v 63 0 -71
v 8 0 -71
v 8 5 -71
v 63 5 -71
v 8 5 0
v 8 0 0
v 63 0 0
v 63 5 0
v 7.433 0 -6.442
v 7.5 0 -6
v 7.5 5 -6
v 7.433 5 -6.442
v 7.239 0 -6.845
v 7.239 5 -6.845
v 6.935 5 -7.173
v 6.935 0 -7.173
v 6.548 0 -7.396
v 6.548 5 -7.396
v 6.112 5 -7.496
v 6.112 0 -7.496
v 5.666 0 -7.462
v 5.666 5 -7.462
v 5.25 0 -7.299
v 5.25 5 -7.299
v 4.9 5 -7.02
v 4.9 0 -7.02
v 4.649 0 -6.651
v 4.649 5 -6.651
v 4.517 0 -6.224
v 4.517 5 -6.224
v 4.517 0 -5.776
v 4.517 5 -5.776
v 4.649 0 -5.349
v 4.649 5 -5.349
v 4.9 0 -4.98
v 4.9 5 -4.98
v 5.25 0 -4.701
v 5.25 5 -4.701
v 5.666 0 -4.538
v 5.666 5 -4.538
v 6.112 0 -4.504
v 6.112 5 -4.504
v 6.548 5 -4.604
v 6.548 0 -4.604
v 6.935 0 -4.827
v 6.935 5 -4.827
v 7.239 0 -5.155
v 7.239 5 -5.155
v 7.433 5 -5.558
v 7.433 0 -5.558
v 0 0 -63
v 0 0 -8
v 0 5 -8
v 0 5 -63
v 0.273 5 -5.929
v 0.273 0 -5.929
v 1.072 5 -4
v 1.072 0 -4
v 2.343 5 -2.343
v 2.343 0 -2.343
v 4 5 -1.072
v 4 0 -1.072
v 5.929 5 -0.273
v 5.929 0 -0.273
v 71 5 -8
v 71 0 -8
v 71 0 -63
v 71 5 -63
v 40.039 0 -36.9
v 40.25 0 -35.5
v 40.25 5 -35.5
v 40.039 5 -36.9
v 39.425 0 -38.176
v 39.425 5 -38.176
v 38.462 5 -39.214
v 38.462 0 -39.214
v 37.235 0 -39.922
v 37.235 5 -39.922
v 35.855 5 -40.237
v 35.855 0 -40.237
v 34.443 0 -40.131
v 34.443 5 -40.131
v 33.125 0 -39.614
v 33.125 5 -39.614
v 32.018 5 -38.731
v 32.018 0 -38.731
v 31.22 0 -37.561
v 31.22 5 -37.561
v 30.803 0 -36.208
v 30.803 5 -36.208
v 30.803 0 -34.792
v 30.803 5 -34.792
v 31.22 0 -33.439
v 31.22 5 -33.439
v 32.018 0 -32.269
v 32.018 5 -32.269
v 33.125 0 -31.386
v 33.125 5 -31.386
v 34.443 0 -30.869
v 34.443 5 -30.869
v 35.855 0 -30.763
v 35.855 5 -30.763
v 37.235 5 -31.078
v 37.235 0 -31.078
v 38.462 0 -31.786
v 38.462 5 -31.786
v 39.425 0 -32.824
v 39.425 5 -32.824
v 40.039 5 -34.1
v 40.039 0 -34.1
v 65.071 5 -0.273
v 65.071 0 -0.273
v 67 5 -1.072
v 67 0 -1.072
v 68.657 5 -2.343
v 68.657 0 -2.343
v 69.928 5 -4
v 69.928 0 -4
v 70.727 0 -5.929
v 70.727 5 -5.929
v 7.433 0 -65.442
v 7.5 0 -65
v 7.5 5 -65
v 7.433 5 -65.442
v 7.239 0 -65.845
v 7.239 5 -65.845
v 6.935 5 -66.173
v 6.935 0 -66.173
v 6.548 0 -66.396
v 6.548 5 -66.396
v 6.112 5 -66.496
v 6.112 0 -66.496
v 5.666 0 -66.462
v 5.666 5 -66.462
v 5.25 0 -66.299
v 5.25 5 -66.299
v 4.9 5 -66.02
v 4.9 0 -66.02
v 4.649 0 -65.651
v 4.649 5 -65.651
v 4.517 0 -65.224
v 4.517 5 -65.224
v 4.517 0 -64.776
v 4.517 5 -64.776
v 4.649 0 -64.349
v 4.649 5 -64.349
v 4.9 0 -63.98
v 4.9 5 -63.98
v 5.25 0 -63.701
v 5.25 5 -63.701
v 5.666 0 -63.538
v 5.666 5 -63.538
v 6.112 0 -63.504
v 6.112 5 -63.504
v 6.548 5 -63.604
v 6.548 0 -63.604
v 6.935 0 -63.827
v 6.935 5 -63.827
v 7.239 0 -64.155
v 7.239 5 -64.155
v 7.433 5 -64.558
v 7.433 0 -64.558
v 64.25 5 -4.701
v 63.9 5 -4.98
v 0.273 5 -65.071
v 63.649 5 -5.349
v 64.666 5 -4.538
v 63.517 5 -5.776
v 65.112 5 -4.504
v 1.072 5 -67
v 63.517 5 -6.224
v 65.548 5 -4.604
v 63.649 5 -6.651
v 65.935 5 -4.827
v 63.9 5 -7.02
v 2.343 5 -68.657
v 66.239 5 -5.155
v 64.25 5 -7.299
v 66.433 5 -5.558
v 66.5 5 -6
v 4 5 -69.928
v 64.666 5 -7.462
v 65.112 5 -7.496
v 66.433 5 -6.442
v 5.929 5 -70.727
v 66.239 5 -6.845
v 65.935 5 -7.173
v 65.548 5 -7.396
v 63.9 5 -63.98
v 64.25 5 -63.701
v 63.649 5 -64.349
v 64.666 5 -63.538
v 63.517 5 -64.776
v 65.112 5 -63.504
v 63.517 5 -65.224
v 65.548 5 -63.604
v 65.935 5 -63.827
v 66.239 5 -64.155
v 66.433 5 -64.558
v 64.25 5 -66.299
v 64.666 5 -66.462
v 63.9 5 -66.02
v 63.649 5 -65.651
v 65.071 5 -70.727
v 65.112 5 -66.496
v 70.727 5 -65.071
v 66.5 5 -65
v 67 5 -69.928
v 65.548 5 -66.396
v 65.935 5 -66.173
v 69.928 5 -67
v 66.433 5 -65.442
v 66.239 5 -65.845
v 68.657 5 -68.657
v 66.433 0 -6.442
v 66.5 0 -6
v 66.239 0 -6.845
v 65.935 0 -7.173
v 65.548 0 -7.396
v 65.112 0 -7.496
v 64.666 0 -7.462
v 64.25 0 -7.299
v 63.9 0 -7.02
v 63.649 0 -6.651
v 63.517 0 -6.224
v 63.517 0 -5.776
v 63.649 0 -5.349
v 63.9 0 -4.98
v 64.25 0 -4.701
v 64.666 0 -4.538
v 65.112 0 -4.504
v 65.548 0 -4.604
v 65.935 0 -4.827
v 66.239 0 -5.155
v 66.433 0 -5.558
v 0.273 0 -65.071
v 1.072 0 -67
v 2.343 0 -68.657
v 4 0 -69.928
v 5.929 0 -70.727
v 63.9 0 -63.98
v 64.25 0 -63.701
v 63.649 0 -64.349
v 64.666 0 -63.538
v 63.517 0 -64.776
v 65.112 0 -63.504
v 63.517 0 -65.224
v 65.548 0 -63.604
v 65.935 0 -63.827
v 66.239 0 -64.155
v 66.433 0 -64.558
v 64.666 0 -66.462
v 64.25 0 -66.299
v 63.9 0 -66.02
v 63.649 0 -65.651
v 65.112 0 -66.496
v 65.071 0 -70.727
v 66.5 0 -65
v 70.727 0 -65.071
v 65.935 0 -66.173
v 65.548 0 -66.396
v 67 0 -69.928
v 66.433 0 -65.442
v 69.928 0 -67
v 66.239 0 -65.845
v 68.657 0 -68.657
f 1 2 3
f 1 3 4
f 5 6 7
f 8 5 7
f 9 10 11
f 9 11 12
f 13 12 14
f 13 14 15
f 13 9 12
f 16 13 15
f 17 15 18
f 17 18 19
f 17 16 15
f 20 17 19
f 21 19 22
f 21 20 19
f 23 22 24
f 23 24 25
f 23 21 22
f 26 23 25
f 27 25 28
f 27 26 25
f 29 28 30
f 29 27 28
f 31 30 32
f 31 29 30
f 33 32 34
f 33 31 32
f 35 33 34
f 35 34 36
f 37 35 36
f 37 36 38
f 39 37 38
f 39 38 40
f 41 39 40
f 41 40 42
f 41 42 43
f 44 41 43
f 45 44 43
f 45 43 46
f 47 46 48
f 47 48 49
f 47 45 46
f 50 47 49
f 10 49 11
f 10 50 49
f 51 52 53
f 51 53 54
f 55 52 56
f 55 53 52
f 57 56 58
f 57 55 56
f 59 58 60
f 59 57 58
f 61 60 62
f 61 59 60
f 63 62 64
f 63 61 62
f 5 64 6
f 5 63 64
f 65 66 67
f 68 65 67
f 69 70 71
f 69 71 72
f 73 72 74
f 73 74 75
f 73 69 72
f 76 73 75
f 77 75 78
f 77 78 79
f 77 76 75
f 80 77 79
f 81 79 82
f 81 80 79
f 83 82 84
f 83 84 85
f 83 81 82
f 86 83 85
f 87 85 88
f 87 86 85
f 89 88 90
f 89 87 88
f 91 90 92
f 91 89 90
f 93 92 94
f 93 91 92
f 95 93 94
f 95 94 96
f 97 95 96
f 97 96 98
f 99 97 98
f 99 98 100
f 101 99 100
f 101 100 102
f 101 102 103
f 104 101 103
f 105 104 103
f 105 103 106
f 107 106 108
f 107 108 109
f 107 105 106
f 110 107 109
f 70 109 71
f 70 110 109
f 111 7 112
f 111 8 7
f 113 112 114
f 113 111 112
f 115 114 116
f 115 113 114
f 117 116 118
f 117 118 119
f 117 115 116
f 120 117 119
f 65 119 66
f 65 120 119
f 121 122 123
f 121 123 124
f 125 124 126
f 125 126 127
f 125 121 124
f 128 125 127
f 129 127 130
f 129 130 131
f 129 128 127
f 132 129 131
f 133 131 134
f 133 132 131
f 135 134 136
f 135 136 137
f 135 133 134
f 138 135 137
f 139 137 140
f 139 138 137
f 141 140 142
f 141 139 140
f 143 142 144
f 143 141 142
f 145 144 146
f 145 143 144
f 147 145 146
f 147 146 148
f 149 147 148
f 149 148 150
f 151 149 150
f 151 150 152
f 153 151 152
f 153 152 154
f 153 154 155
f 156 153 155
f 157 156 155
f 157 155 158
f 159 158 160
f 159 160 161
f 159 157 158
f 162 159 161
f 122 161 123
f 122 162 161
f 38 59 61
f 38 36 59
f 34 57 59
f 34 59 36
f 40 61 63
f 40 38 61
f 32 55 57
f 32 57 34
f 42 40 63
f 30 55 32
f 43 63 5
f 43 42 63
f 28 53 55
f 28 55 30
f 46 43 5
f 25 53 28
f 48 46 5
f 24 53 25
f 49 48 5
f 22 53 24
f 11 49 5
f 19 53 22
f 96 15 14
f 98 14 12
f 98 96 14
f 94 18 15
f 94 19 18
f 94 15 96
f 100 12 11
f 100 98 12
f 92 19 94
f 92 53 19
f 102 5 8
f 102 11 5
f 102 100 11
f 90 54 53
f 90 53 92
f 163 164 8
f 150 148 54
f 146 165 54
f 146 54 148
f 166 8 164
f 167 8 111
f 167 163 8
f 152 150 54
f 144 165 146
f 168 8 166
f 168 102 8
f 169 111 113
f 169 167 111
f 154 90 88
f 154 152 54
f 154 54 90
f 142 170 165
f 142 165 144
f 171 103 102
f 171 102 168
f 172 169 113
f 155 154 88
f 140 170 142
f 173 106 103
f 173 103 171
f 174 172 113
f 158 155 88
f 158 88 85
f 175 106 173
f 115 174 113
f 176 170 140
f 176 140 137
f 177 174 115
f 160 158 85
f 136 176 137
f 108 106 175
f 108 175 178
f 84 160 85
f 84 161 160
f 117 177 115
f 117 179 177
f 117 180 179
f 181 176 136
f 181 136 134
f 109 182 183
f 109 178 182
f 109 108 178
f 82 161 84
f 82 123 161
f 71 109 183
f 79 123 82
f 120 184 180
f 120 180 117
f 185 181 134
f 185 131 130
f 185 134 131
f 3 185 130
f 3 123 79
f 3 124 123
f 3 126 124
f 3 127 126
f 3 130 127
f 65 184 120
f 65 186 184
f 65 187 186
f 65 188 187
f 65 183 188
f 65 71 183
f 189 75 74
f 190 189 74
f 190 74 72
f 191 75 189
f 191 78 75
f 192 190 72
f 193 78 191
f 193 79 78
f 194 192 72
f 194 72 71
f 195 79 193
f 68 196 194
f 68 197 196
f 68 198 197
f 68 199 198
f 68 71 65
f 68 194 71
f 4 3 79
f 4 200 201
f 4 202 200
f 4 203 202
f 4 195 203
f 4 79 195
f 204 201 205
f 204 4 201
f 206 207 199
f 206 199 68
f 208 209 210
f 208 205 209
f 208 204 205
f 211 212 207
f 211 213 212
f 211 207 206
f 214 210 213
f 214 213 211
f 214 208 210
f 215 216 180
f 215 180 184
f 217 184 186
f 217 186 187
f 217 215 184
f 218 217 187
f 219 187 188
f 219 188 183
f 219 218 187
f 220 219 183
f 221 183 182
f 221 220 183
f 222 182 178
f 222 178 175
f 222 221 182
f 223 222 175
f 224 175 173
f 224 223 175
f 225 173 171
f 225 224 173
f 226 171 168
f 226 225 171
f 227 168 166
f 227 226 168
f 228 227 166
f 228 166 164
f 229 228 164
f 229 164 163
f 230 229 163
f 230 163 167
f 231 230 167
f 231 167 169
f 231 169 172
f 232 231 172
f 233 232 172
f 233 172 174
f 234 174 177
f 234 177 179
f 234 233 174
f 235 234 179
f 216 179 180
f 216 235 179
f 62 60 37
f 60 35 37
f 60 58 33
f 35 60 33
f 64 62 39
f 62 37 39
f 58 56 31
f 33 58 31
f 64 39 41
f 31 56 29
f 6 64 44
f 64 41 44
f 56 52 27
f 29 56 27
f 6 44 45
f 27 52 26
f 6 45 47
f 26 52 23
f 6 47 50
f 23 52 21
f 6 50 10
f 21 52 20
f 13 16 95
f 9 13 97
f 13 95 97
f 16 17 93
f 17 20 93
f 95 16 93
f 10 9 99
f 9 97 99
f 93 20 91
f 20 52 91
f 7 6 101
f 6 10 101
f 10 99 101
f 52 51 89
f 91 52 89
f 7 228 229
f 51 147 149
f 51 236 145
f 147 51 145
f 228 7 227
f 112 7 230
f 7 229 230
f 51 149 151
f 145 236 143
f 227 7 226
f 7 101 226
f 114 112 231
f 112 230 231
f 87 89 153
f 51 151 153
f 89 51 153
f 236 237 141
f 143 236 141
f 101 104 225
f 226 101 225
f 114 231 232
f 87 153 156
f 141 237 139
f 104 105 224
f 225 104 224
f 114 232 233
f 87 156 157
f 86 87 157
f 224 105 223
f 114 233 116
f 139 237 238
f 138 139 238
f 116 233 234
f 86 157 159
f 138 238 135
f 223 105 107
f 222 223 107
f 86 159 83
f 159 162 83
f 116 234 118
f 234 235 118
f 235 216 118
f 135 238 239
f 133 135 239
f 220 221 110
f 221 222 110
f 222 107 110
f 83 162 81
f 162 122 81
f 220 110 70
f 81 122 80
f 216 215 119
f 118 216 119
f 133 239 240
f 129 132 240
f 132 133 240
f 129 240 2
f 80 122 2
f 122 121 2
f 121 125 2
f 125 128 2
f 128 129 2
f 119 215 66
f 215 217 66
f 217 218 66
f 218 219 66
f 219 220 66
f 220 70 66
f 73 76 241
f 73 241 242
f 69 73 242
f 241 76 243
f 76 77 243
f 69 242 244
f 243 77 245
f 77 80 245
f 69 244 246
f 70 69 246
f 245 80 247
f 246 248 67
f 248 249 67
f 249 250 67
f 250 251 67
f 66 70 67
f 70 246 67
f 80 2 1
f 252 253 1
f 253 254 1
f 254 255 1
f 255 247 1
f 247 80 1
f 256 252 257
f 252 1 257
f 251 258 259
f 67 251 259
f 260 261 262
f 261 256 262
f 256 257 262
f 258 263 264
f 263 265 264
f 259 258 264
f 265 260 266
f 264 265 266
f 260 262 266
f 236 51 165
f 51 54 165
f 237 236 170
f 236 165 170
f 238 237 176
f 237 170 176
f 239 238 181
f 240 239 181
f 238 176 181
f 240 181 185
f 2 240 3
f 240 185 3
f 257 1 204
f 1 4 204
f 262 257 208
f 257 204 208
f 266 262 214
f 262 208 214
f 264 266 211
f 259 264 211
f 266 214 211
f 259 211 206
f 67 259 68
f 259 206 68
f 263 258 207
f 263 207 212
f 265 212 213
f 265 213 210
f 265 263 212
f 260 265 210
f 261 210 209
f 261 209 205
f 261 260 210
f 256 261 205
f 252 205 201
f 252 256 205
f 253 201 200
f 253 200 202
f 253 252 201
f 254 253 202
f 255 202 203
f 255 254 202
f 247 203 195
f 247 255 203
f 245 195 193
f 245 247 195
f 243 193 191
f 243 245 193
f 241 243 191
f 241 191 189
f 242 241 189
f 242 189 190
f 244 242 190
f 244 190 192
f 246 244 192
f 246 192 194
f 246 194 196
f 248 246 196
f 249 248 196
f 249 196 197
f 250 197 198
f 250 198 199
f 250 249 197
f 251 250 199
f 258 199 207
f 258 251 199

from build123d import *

# Parameters (mm, degrees)
SKETCH1_W           = 71
SKETCH1_H           = 71
SKETCH1_R           = 1.5
SKETCH1_R_2         = 4.75
BOSS_EXTRUDE1_DEPTH = 5
FILLET1_R           = 8


with BuildPart() as part:
    # Sketch1 → Boss-Extrude1 (new body)
    with BuildSketch(Plane(origin=(0, 0, 0), x_dir=(1, 0, 0), z_dir=(0, 1, 0))):
        with Locations((35.5, 35.5)):
            Rectangle(SKETCH1_W, SKETCH1_H)
        with Locations((6, 6)):
            Circle(SKETCH1_R, mode=Mode.SUBTRACT)
        with Locations((65, 6)):
            Circle(SKETCH1_R, mode=Mode.SUBTRACT)
        with Locations((65, 65)):
            Circle(SKETCH1_R, mode=Mode.SUBTRACT)
        with Locations((6, 65)):
            Circle(SKETCH1_R, mode=Mode.SUBTRACT)
        with Locations((35.5, 35.5)):
            Circle(SKETCH1_R_2, mode=Mode.SUBTRACT)
    extrude(amount=BOSS_EXTRUDE1_DEPTH)

    # Fillet1
    fillet1_edges = [part.edges().sort_by_distance(p)[0] for p in [
        (0, 2.5, -71),
        (71, 2.5, -71),
        (71, 2.5, 0),
        (0, 2.5, 0),
    ]]
    fillet(fillet1_edges, radius=FILLET1_R)


solid = part.part
